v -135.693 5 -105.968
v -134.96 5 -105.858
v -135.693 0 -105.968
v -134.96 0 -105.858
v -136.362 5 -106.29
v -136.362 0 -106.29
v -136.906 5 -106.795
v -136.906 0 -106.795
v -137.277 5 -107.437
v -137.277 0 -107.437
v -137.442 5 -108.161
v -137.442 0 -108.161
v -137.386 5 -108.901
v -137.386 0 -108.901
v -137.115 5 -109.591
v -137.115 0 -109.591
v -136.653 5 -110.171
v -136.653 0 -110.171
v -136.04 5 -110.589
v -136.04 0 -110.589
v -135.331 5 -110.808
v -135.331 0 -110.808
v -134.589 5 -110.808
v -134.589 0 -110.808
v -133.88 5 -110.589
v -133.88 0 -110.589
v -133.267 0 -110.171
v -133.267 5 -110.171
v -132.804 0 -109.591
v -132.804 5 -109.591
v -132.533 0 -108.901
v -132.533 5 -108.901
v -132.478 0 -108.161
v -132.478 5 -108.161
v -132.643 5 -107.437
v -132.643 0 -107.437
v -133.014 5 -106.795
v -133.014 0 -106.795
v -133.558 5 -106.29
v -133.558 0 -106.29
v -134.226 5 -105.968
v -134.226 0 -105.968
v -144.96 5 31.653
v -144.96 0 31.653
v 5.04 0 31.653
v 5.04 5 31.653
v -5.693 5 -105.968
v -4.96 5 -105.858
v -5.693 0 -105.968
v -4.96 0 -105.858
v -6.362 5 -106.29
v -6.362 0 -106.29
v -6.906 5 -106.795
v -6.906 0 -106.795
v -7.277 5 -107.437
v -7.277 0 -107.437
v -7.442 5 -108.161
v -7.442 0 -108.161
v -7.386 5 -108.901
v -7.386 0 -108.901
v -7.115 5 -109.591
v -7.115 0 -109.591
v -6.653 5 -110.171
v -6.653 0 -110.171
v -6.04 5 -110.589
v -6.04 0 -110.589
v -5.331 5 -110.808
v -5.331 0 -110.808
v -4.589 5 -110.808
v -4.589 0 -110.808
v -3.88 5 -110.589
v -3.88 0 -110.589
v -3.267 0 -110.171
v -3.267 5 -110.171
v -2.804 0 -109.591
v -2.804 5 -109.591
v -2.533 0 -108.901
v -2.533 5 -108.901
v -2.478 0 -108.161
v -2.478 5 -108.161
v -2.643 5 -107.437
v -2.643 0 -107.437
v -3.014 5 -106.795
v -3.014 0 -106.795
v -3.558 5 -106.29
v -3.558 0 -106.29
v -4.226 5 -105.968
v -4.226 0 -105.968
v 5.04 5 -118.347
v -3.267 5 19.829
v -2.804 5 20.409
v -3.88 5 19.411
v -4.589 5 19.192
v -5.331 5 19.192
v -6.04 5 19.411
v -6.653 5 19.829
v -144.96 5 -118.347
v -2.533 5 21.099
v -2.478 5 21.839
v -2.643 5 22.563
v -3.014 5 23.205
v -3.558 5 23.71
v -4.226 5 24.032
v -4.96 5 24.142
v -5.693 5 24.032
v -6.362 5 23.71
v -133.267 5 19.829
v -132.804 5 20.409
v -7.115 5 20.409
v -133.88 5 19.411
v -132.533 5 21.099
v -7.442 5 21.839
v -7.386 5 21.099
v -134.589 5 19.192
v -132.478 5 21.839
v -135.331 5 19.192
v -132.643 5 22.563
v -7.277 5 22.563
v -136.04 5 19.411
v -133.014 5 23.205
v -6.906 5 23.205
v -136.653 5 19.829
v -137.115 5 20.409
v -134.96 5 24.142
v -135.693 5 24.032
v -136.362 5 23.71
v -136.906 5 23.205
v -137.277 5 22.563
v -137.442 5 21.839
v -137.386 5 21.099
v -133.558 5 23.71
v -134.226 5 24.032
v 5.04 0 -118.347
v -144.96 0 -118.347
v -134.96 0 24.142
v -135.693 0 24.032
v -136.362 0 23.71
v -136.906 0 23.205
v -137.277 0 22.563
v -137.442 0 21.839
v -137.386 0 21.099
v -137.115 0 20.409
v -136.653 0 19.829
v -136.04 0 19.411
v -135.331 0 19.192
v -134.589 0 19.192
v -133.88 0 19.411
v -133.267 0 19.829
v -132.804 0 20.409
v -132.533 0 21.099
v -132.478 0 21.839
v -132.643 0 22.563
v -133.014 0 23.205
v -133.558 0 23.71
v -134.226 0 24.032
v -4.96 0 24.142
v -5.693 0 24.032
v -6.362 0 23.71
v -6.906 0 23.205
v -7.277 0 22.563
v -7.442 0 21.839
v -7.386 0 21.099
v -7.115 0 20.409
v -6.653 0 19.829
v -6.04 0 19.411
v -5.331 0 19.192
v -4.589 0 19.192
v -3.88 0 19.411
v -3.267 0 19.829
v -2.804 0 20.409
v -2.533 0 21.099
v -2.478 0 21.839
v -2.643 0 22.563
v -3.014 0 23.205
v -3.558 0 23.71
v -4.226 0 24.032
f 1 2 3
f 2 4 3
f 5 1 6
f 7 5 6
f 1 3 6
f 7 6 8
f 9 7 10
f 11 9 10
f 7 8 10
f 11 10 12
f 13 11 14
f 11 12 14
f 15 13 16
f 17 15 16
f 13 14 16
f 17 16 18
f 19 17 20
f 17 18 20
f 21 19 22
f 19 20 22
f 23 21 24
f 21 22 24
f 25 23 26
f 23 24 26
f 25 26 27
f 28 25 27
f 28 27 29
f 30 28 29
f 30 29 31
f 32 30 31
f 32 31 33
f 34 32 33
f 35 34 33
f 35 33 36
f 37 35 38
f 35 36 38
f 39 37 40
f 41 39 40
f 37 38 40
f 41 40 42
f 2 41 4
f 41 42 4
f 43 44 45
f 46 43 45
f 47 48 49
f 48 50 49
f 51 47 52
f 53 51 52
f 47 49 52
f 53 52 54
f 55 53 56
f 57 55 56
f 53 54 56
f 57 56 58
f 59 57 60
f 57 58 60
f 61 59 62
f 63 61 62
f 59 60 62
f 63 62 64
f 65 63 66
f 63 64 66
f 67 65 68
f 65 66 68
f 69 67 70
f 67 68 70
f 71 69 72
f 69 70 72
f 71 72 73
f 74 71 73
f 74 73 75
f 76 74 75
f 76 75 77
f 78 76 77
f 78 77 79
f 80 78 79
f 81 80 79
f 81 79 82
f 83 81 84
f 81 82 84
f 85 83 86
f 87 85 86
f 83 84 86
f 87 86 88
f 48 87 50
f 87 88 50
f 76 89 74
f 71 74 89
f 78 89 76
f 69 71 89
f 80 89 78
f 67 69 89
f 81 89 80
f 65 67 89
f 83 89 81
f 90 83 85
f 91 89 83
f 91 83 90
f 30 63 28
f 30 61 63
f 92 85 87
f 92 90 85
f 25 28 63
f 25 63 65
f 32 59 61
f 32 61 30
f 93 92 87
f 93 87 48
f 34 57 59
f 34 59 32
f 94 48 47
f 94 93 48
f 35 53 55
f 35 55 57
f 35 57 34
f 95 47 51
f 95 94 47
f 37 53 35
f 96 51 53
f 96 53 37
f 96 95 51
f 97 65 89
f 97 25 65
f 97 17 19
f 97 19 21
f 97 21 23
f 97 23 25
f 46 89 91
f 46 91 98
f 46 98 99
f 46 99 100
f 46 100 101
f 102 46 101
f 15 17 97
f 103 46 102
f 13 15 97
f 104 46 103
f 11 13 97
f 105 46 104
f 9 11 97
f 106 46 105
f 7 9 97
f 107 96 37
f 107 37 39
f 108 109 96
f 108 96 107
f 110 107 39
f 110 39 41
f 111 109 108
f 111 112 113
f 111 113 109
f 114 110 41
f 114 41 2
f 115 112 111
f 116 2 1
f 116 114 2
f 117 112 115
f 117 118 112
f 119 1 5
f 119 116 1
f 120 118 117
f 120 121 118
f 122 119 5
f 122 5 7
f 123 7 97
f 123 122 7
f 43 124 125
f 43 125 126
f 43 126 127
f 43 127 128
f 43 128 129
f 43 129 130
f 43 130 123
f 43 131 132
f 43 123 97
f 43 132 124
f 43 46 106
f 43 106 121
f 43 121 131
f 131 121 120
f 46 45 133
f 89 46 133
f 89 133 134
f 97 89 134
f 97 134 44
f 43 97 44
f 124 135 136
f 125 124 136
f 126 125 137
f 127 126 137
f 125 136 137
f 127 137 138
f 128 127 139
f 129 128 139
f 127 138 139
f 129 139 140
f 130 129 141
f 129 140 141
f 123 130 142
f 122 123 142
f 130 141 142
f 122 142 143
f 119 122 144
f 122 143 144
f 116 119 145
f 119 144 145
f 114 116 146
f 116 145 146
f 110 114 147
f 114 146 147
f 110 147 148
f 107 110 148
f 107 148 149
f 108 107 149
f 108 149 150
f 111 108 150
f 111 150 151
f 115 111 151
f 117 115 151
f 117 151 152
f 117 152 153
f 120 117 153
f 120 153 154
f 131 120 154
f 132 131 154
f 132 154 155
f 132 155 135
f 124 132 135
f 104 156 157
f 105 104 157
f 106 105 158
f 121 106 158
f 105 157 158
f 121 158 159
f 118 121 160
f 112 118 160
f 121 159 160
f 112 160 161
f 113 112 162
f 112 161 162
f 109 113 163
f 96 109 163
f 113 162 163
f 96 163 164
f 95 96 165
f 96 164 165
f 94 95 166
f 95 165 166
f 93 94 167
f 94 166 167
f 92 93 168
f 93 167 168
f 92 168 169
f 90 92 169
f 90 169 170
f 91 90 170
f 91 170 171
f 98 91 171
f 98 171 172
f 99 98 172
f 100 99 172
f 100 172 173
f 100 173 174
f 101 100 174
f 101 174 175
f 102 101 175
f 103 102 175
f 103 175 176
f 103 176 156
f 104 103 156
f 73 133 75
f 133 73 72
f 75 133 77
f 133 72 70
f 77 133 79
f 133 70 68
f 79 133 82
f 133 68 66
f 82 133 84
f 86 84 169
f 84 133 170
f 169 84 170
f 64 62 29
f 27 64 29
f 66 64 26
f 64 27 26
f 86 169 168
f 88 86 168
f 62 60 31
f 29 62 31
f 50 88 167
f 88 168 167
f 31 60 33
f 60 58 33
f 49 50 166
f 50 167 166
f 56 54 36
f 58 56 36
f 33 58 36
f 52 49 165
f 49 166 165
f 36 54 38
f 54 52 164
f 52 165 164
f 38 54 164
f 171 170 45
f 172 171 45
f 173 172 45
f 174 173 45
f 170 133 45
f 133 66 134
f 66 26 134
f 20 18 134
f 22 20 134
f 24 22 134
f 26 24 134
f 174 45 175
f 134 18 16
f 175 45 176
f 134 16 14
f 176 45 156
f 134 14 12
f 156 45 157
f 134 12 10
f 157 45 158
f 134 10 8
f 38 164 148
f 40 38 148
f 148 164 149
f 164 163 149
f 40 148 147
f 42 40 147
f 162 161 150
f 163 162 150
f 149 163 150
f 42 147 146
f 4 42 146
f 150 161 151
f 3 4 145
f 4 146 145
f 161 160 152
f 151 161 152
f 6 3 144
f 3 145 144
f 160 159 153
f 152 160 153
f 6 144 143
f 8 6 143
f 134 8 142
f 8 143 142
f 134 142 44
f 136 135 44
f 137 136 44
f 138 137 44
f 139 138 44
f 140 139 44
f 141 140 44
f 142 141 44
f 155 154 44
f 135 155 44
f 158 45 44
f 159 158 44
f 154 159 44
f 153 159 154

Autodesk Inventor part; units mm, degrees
ref_plane "YZ Plane" through (0, 0, 0) normal (1, 0, 0) x (0, 1, 0)
ref_plane "XZ Plane" through (0, 0, 0) normal (0, 1, 0) x (-1, 0, 0)
ref_plane "XY Plane" through (0, 0, 0) normal (0, 0, 1) x (1, 0, 0)
sketch "Skizze1" plane through (0, 0, 0) normal (0, 1, 0) x (-1, 0, 0)
  line L0 (144.9597, 31.6532) -> (-5.0403, 31.6532)
  line L1 (-5.0403, 31.6532) -> (-5.0403, -118.3468)
  line L2 (-5.0403, -118.3468) -> (144.9597, -118.3468)
  line L3 (144.9597, -118.3468) -> (144.9597, 31.6532)
  line L4 (144.9597, 31.6532) -> (-5.0403, -118.3468) construction
  line L5 (-5.0403, 31.6532) -> (144.9597, -118.3468) construction
  point P0 (0, 0)
  point P1 (69.9597, -43.3468)
  dimension "d0" = 150
  dimension "d1" = 150
extrude "Extrusion1" add sketch "Skizze1" along normal blind 5
sketch "Skizze2" plane through (0, 5, 0) normal (0, 1, 0) x (1, 0, 0)
  circle A0 centre (-134.9597, -21.6532) radius 2.5
  circle A1 centre (-134.9597, 108.3468) radius 2.5
  circle A2 centre (-4.9597, -21.6532) radius 2.5
  circle A3 centre (-4.9597, 108.3468) radius 2.5
  line L0 (-144.9597, 118.3468) -> (-144.9597, -31.6532) projected
  line L1 (-144.9597, -31.6532) -> (5.0403, -31.6532) projected
  line L2 (5.0403, 118.3468) -> (-144.9597, 118.3468) projected
  line L3 (5.0403, -31.6532) -> (5.0403, 118.3468) projected
  point P0 (0, 0)
  dimension "d4" = 5
  dimension "d5" = 5
  dimension "d6" = 5
  dimension "d7" = 5
  dimension "d8" = 10
  dimension "d9" = 10
  dimension "d15" = 10
  dimension "d16" = 10
  dimension "d17" = 10
  dimension "d18" = 10
  dimension "d19" = 10
  dimension "d20" = 10
hole "Bohrung1" at (-134.9597, 5, 21.6532) at (-134.9597, 5, -108.3468) at (-4.9597, 5, -108.3468) at (-4.9597, 5, 21.6532) direction (0, -1, 0) diameter 4.978 depth 19.05 tip angle 118 thread size "1/4-20 UNC" class "2B" standard "ANSI Unified Screw Threads"
properties part number "Grundplatte"
